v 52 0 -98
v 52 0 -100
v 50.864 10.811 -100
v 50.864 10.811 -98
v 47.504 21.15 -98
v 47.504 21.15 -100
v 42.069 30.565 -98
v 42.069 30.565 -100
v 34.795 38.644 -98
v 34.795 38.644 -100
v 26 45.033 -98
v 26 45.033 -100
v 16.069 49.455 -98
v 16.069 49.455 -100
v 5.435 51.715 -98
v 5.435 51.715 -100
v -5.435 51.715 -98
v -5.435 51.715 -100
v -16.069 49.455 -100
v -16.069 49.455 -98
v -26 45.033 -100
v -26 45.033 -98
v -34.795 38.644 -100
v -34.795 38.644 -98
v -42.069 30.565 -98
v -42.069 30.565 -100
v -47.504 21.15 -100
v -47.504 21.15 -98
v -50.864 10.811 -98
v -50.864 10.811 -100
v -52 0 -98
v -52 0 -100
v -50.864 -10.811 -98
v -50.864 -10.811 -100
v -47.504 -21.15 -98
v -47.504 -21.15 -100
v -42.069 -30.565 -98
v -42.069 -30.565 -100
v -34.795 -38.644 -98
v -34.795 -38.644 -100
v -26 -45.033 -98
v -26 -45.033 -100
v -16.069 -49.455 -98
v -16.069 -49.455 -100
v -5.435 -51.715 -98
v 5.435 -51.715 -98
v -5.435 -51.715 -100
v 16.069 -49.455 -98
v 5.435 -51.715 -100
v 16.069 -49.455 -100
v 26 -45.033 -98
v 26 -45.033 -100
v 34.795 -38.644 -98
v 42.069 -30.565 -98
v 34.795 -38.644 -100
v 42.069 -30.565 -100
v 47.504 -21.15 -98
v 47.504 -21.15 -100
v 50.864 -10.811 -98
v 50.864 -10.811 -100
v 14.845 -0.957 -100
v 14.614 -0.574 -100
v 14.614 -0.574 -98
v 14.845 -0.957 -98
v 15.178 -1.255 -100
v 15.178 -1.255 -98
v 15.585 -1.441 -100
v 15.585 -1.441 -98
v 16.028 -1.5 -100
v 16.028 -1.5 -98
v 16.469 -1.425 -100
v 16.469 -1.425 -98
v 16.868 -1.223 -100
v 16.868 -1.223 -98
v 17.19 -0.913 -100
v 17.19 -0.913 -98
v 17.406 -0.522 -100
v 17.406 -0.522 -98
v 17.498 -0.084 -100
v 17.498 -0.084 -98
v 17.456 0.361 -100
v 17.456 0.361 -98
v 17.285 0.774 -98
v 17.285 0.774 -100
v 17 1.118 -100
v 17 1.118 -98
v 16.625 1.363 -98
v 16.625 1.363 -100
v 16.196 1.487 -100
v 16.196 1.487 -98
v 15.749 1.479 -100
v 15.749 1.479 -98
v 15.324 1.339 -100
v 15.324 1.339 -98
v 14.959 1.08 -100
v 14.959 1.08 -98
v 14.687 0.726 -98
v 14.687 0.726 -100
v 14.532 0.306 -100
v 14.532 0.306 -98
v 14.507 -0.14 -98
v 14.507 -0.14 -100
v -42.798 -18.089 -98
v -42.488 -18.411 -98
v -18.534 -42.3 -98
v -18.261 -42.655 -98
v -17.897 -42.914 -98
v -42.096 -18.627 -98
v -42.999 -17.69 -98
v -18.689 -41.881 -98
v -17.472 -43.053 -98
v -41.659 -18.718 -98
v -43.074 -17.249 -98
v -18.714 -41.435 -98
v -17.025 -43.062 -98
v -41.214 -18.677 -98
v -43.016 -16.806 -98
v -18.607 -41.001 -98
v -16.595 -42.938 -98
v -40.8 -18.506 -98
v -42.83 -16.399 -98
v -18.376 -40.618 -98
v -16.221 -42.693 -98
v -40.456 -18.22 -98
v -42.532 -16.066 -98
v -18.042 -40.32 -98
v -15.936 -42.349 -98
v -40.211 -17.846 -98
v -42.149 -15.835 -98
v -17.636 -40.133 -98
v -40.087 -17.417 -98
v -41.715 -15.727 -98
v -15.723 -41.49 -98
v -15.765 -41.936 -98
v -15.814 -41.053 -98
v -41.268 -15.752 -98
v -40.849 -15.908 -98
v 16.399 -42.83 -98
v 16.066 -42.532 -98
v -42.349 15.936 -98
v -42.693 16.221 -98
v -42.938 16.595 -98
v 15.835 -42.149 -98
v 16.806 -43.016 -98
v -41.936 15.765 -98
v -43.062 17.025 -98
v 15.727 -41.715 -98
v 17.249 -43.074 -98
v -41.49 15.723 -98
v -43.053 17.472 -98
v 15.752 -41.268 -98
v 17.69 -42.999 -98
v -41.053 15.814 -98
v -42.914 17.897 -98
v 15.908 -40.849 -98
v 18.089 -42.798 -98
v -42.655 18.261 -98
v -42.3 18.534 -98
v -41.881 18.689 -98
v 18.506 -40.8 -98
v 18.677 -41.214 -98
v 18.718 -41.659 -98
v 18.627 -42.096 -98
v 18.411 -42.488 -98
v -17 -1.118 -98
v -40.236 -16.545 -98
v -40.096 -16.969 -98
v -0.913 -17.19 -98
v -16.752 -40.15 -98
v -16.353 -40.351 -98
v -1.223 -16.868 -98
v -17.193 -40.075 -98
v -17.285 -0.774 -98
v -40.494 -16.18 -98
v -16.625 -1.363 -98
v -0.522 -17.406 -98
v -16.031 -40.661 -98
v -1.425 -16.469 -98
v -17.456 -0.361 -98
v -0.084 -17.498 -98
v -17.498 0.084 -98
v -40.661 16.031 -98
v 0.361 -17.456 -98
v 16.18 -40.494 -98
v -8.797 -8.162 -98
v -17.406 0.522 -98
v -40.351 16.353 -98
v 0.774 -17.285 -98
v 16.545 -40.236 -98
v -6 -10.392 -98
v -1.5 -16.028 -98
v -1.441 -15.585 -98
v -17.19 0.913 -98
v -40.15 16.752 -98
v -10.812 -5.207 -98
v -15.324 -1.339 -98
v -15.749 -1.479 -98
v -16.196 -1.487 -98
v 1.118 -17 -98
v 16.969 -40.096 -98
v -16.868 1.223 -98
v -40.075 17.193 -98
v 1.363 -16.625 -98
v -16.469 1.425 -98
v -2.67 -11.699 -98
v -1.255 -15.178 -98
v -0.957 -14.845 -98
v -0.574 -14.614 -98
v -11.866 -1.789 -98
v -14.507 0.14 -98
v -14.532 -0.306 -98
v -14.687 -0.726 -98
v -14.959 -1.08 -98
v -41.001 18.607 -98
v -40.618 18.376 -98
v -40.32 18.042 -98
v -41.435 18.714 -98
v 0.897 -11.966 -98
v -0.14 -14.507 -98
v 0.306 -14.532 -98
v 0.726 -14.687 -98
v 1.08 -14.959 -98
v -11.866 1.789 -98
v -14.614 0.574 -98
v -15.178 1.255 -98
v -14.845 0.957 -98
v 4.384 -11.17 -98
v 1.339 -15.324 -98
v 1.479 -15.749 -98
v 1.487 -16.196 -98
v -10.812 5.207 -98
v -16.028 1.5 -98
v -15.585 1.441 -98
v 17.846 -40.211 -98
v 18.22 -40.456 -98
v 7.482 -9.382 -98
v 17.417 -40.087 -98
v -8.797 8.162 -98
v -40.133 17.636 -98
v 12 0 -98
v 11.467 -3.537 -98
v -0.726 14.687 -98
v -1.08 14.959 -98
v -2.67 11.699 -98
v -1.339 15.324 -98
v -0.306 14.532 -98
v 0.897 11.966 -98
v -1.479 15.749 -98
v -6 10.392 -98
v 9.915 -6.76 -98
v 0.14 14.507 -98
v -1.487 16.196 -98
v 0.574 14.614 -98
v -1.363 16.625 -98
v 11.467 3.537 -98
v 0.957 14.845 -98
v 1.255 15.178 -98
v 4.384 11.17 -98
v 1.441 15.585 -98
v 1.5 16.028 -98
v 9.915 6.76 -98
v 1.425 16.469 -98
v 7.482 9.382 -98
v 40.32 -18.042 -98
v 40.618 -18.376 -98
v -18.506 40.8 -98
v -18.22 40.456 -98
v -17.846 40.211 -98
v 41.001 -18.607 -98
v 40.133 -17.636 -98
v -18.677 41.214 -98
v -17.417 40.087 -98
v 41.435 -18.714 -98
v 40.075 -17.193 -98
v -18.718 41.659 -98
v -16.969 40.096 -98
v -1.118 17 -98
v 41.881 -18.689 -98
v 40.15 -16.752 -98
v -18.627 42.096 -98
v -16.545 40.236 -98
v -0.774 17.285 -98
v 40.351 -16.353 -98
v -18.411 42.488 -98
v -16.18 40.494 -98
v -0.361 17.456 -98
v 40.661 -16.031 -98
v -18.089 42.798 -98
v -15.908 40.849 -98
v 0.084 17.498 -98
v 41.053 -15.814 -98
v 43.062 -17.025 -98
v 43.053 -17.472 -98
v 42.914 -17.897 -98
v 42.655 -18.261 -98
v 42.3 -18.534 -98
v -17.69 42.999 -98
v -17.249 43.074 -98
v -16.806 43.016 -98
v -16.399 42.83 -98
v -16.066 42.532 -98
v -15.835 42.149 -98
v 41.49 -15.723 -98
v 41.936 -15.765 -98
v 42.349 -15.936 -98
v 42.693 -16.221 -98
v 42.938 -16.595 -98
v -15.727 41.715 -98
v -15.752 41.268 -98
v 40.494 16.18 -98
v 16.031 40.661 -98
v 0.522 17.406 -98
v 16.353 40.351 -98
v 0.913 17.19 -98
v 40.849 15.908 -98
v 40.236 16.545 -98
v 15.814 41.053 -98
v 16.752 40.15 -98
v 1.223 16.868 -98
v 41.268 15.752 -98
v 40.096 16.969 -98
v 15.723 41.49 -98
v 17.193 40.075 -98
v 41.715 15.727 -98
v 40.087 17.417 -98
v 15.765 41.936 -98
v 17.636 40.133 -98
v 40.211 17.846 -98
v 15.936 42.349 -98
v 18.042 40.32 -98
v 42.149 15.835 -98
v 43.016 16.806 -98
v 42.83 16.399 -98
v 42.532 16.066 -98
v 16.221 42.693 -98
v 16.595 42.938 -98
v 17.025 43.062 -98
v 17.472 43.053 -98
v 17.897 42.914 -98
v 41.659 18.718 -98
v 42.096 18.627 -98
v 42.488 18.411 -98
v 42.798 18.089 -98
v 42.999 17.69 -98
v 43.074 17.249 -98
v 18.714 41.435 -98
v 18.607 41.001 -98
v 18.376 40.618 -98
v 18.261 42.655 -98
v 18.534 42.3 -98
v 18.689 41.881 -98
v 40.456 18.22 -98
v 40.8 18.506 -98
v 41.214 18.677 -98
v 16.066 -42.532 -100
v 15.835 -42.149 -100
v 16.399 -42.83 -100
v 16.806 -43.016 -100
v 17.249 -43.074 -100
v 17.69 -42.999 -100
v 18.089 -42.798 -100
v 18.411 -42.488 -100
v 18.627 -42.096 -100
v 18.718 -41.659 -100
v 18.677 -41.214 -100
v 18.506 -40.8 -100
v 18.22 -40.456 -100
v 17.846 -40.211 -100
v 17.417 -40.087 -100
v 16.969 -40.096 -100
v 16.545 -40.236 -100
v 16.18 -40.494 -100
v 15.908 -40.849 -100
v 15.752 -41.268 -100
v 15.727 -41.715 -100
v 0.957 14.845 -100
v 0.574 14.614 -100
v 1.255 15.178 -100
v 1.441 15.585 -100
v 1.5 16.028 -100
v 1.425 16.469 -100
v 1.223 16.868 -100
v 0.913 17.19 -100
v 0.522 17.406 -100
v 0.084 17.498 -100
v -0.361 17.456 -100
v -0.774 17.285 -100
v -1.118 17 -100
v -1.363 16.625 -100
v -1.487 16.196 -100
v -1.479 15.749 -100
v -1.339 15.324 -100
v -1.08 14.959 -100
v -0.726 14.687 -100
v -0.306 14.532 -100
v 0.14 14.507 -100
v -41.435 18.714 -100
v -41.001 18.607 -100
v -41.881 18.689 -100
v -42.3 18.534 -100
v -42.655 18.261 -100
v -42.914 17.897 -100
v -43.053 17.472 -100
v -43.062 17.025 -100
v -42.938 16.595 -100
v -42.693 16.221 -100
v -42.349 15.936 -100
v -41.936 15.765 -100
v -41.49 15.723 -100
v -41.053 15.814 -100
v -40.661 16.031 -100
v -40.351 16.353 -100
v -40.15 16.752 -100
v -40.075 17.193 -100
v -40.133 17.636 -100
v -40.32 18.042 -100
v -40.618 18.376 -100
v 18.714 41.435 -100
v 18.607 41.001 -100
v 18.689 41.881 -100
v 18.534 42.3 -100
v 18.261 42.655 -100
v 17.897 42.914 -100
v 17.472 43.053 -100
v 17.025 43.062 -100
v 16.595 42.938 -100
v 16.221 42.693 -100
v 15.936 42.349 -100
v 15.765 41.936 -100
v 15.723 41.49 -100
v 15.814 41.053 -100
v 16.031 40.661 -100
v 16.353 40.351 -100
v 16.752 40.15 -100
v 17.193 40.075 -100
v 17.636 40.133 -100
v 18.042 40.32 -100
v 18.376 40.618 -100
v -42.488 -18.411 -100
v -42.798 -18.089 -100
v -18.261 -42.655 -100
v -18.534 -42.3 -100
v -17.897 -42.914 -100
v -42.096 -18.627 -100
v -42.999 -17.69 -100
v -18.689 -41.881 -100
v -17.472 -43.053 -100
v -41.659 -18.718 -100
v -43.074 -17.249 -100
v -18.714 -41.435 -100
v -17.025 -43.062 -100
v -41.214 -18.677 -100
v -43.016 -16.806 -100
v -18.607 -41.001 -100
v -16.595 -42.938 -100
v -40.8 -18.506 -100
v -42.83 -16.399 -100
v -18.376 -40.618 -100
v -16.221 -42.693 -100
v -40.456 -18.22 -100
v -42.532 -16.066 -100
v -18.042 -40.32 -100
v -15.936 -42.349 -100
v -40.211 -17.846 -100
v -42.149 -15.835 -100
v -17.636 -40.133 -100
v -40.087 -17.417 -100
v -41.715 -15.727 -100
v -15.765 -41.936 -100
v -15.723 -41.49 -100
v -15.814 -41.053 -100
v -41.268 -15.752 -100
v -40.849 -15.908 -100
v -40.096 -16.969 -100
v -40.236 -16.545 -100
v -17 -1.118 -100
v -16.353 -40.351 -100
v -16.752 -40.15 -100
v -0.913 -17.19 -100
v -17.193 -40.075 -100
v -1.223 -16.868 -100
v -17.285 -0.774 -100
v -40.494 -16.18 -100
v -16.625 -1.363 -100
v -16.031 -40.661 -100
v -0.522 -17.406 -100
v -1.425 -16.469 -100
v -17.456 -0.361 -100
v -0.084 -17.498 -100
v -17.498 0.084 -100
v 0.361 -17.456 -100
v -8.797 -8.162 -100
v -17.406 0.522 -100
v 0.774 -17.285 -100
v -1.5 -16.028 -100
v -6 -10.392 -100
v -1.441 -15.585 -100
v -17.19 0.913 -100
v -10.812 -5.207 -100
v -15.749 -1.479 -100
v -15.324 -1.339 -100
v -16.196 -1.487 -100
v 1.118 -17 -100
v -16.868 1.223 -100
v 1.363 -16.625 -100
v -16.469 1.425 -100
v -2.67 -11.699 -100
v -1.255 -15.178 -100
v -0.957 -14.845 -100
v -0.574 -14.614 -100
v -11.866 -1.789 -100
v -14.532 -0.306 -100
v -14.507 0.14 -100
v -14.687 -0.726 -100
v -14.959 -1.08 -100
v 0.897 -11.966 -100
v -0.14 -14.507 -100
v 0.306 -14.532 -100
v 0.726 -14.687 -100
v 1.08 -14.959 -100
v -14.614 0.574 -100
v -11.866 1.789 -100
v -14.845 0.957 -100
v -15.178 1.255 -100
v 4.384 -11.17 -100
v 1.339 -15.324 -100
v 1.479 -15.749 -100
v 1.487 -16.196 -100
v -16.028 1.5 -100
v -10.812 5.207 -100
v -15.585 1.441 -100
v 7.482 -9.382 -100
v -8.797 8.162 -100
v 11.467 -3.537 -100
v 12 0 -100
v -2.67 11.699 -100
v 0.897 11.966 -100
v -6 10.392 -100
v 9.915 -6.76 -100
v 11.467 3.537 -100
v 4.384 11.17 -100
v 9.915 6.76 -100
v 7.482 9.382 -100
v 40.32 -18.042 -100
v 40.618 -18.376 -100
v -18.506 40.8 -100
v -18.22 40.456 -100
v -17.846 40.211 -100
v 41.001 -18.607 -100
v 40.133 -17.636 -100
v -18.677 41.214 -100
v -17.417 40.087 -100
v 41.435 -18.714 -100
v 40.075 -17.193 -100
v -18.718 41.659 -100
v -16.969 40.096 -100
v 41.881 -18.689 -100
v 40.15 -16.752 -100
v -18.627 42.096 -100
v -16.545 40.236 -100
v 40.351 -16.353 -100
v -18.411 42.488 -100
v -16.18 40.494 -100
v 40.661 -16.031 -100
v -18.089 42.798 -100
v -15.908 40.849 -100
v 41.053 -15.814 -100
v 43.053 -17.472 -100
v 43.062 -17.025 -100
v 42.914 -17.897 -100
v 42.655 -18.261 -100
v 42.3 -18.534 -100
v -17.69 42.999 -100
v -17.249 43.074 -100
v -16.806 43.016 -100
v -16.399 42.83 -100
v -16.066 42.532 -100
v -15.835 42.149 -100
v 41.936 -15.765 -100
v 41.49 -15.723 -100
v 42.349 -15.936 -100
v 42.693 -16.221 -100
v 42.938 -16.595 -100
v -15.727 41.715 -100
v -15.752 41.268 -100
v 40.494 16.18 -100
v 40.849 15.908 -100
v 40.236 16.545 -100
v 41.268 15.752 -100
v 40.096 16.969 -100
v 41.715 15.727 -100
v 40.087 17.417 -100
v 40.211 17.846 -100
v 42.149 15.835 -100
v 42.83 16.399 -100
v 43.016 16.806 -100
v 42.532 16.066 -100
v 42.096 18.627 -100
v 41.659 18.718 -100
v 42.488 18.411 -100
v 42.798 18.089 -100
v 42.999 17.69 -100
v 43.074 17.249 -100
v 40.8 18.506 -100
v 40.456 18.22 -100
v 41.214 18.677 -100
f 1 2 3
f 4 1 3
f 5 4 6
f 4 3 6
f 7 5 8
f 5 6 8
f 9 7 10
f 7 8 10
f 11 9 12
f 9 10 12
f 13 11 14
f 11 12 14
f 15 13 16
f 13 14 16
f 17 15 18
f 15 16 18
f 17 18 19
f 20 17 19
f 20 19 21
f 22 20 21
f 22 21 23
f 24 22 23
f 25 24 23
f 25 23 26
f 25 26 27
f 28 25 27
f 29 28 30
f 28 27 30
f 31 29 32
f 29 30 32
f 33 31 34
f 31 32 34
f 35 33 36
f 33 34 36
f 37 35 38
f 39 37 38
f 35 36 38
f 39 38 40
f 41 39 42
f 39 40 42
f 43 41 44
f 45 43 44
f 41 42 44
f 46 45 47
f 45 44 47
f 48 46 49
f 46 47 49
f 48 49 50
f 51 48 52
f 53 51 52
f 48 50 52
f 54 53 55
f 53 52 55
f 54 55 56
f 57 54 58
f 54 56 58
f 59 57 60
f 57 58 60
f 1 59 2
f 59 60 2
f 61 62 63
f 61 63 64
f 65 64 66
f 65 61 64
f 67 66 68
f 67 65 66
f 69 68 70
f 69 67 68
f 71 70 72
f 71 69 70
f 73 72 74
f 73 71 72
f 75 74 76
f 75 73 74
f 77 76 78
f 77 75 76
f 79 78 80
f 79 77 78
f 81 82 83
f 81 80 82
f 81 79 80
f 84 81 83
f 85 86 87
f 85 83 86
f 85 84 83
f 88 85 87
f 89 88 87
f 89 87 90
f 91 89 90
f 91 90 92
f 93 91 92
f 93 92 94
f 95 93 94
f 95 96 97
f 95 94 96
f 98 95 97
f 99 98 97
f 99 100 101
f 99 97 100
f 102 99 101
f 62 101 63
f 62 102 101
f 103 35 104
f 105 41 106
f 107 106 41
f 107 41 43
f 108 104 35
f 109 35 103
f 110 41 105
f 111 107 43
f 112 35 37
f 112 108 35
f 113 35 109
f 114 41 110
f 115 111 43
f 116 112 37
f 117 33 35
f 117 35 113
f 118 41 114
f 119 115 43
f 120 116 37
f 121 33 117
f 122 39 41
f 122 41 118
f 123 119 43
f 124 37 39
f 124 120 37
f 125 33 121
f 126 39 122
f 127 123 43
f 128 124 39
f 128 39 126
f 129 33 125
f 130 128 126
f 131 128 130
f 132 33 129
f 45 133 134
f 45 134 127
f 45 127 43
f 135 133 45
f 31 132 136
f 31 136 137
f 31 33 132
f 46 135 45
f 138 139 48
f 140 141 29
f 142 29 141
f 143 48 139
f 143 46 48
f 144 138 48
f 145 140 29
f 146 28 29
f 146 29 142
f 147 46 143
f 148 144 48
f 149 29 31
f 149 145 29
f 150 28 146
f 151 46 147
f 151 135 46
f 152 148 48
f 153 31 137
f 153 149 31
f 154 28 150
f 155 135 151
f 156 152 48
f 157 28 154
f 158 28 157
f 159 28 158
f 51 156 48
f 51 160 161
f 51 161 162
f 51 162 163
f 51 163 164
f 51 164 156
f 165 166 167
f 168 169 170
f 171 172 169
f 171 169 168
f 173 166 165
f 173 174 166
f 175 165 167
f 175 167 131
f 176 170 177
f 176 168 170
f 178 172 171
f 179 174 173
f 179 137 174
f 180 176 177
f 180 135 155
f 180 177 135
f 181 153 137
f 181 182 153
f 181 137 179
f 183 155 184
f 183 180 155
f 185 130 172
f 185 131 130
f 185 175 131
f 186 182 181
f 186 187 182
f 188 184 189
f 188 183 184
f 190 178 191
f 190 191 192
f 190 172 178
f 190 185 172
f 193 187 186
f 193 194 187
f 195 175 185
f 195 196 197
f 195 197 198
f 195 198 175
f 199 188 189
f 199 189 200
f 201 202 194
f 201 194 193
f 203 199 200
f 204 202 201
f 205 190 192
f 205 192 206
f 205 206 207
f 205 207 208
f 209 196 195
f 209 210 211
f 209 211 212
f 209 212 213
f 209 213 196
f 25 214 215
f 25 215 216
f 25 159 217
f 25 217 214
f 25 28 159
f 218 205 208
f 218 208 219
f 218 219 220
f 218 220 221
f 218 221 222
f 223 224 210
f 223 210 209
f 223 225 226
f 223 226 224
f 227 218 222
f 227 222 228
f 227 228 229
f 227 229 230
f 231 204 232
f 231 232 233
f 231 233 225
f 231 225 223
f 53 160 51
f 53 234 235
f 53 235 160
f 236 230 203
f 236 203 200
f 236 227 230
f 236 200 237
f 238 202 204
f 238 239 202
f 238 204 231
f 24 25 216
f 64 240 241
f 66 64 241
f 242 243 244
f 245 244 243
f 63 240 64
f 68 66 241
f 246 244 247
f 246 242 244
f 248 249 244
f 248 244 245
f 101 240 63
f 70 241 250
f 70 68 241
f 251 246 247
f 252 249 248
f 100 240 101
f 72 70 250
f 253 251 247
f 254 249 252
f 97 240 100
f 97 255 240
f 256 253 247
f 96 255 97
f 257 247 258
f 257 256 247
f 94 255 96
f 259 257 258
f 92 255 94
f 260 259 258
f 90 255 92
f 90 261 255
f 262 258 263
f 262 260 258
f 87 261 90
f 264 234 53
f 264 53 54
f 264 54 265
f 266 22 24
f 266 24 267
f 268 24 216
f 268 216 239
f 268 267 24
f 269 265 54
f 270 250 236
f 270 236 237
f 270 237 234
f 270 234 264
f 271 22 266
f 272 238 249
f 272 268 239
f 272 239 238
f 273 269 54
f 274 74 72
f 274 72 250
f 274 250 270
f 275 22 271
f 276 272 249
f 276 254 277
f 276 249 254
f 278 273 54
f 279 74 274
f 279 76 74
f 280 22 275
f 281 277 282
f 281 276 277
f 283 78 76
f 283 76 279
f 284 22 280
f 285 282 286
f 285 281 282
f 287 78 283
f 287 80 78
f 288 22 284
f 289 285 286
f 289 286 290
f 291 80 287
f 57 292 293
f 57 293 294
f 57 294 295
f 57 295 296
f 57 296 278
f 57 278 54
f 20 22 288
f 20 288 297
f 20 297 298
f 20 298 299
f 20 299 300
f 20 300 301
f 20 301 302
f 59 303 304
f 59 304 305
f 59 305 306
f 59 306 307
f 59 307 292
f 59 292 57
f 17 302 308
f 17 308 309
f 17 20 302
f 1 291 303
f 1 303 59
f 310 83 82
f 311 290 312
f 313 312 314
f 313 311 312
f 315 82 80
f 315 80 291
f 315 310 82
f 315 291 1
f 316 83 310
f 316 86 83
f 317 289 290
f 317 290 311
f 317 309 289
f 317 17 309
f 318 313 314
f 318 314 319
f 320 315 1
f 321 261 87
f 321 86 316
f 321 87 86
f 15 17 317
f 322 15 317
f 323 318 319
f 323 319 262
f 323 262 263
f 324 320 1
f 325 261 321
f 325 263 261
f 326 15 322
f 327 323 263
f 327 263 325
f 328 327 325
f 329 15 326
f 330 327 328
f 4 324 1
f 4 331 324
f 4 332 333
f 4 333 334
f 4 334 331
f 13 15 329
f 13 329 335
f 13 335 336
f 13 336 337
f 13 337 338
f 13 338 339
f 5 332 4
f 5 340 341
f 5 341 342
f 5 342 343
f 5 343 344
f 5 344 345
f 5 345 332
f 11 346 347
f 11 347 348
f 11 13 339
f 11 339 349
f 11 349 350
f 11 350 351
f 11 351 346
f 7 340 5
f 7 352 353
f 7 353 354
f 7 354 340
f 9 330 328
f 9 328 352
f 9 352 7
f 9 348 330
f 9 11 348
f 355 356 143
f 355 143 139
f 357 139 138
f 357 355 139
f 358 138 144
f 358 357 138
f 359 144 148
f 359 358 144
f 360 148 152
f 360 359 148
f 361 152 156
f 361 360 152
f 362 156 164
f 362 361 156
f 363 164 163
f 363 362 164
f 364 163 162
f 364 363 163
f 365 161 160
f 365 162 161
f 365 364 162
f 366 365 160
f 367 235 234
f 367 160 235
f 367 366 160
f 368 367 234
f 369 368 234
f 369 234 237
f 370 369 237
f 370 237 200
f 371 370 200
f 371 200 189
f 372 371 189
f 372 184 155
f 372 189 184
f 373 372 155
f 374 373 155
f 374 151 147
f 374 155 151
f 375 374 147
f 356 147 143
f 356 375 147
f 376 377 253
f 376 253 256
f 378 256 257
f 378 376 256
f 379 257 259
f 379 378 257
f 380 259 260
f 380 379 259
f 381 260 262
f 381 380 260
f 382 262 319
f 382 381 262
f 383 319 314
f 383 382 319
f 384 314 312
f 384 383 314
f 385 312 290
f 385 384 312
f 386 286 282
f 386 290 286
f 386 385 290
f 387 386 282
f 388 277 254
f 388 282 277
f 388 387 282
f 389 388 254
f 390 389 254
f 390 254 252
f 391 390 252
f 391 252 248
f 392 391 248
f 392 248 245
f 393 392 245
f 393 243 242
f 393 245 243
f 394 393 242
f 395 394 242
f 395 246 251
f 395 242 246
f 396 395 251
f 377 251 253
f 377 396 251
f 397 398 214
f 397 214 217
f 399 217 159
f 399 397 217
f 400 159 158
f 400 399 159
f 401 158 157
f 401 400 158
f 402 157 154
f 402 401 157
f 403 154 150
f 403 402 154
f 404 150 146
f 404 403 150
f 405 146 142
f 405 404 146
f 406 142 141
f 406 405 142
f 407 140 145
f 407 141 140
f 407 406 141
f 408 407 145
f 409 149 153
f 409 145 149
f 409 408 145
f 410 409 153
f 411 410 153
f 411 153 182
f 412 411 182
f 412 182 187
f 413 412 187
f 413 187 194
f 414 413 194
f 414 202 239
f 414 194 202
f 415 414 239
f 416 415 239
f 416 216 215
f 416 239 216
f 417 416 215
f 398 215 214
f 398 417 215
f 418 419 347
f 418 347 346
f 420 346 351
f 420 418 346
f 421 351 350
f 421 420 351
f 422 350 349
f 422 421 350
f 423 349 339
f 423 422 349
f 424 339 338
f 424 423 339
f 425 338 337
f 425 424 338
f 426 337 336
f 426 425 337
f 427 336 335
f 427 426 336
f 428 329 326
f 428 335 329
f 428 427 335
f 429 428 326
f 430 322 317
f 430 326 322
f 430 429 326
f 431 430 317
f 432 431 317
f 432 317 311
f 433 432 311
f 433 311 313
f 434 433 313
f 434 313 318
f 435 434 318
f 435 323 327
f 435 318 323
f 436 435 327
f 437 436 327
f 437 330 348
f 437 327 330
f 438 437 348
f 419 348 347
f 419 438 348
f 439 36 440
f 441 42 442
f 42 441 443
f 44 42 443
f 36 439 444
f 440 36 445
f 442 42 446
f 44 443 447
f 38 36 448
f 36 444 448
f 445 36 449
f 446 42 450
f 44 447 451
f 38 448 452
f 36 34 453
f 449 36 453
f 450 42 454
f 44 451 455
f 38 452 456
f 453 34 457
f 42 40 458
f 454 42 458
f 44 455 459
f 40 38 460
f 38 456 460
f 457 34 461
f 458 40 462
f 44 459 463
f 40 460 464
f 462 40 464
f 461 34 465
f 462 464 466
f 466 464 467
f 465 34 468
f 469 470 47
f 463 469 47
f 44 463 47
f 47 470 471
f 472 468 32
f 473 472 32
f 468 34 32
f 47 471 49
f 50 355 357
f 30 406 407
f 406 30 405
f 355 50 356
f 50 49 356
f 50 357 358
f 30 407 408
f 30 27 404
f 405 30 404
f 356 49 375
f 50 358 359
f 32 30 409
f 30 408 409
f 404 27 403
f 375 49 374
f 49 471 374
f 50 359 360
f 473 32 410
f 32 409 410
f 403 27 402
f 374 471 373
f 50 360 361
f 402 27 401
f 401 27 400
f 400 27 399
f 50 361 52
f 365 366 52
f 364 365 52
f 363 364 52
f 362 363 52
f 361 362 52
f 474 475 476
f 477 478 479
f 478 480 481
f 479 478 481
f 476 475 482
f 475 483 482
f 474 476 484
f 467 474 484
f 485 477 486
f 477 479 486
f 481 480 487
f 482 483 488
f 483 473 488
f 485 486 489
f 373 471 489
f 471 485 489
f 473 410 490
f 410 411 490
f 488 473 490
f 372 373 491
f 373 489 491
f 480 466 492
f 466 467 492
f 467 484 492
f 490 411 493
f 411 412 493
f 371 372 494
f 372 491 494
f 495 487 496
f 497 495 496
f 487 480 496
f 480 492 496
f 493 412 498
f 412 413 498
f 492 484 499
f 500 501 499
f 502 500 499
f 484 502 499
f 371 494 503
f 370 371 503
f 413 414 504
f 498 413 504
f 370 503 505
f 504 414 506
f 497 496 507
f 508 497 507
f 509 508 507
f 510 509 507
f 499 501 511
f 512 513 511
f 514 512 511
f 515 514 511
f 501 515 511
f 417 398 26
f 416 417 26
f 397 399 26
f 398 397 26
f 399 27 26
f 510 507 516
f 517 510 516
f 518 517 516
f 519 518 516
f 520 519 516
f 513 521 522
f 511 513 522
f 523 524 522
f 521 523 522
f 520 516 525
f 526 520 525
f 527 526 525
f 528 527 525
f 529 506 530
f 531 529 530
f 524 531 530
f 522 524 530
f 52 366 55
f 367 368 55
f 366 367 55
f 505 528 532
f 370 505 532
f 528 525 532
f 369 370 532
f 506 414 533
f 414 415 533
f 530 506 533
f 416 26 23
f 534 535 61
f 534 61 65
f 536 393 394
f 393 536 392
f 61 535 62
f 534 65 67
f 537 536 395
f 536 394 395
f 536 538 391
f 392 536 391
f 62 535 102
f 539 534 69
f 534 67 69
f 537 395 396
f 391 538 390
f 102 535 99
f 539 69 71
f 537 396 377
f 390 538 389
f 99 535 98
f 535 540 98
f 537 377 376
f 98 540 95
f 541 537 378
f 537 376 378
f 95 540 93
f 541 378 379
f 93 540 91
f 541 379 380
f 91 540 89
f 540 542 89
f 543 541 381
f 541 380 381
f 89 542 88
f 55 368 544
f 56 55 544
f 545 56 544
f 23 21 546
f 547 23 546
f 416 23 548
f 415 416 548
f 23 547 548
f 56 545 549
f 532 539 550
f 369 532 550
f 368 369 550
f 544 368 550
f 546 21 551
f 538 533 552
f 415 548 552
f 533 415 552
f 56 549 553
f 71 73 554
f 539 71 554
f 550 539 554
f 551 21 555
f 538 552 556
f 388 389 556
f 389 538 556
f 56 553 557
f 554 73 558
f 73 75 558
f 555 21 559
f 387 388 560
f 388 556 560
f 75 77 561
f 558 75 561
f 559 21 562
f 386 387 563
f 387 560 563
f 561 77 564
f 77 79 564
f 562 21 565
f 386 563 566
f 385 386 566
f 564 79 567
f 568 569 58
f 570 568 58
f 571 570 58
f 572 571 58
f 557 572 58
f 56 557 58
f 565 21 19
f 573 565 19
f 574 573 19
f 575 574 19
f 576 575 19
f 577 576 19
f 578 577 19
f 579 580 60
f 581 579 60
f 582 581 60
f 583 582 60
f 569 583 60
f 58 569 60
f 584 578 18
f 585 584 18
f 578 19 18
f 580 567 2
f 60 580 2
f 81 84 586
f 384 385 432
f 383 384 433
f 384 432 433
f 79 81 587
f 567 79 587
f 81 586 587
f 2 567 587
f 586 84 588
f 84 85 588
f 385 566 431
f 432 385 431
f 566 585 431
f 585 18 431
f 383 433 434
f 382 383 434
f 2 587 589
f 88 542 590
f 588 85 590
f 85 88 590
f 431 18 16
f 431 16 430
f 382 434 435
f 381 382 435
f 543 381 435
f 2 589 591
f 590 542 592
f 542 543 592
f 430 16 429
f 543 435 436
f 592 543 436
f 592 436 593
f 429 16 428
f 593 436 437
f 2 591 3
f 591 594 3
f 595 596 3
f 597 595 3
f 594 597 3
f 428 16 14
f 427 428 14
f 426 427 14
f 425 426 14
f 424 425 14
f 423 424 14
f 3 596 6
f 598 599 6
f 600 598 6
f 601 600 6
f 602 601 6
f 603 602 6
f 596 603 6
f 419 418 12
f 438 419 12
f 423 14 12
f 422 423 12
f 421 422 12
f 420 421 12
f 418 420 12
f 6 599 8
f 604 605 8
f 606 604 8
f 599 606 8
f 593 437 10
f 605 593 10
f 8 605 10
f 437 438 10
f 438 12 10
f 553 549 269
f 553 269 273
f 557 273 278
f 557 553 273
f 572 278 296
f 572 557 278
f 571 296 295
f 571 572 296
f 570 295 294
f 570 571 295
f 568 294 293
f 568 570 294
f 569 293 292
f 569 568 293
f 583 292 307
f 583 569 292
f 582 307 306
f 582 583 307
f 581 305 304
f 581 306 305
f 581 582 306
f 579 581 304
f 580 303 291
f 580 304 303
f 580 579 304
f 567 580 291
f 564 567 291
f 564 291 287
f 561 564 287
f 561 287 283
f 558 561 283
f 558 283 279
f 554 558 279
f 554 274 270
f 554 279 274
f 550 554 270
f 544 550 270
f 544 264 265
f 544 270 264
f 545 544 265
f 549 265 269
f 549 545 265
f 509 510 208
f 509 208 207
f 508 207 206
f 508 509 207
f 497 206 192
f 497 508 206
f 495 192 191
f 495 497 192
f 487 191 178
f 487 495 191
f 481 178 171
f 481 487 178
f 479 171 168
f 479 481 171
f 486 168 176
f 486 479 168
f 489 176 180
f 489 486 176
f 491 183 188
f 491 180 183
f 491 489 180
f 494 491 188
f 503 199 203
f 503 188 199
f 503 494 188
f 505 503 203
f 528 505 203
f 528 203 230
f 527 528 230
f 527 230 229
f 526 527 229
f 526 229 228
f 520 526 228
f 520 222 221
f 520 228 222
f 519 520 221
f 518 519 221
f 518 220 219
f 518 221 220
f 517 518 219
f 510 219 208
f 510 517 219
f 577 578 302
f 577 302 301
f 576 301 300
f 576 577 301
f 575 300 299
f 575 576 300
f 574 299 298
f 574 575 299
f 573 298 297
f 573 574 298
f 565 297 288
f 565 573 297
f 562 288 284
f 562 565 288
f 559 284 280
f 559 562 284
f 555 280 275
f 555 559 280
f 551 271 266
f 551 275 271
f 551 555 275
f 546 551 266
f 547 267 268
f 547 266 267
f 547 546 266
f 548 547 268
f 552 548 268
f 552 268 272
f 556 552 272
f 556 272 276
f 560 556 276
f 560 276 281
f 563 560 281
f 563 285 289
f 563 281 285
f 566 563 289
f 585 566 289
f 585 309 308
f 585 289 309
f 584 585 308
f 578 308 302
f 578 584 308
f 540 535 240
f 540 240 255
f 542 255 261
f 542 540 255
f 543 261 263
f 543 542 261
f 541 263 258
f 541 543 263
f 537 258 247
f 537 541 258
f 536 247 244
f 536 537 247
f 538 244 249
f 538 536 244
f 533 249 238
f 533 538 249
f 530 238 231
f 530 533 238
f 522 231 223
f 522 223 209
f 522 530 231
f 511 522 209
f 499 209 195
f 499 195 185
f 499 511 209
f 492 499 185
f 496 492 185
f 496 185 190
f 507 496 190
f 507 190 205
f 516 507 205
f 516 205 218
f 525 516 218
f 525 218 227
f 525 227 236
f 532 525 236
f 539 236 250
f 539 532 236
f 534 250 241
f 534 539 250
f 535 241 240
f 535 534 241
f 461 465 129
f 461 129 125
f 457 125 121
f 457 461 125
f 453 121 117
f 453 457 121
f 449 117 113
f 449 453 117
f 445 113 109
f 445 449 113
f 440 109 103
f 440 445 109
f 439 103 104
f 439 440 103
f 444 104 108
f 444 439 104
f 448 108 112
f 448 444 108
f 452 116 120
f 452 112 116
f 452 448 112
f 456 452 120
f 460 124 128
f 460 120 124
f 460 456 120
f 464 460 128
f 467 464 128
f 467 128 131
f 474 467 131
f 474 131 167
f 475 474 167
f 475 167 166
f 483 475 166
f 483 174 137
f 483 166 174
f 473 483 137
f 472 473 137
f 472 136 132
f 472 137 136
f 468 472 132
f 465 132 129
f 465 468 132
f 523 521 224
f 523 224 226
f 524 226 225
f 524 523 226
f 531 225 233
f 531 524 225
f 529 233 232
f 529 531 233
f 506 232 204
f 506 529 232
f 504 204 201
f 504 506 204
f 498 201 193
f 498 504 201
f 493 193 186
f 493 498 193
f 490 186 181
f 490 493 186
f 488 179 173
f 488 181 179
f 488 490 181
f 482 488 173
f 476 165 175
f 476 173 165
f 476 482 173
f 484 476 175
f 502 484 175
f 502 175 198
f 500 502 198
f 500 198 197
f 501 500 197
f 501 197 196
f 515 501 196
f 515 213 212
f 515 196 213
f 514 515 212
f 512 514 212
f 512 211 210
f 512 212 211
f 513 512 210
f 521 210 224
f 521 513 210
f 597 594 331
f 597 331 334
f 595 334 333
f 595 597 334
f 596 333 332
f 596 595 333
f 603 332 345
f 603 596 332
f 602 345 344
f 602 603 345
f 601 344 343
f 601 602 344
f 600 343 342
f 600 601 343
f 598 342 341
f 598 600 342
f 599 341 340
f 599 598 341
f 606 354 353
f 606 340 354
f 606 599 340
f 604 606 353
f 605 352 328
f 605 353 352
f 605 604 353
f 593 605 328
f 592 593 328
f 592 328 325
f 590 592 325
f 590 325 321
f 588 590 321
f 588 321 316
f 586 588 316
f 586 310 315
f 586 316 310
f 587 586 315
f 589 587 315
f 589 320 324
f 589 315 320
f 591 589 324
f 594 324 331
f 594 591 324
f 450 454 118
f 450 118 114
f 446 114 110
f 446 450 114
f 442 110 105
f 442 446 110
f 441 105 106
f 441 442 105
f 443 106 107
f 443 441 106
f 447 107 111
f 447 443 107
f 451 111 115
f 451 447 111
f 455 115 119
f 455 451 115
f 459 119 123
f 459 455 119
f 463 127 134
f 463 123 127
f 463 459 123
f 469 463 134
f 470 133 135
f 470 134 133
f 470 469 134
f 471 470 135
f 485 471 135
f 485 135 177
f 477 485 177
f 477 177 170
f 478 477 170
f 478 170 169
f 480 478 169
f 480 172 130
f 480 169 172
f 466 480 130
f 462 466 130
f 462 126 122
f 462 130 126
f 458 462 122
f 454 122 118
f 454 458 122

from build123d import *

# Parameters (mm, degrees)
CYLINDER623_R               = 1.5
CYLINDER623_DEPTH           = 20
CYLINDER623_PLACEMENT_ANGLE = 45
CYLINDER632_R               = 1.5
CYLINDER632_DEPTH           = 20
CYLINDER629_R               = 1.5
CYLINDER629_DEPTH           = 20
CYLINDER629_PLACEMENT_ANGLE = 135
CYLINDER639_R               = 1.5
CYLINDER639_DEPTH           = 20
CYLINDER638_R               = 1.5
CYLINDER638_DEPTH           = 20
CYLINDER638_PLACEMENT_ANGLE = 225
CYLINDER631_R               = 1.5
CYLINDER631_DEPTH           = 20
CYLINDER633_R               = 1.5
CYLINDER633_DEPTH           = 20
CYLINDER633_PLACEMENT_ANGLE = 45
CYLINDER628_R               = 1.5
CYLINDER628_DEPTH           = 20
COMPOUND654_PLACEMENT_ANGLE = 22.5
CYLINDER625_R               = 1.5
CYLINDER625_DEPTH           = 16
CYLINDER625_PLACEMENT_ANGLE = 67.5
CYLINDER626_R               = 1.5
CYLINDER626_DEPTH           = 16
CYLINDER626_PLACEMENT_ANGLE = 22.5
CYLINDER627_R               = 1.5
CYLINDER627_DEPTH           = 16
CYLINDER627_PLACEMENT_ANGLE = 112.5
CYLINDER630_R               = 1.5
CYLINDER630_DEPTH           = 16
CYLINDER630_PLACEMENT_ANGLE = 202.5
TUBE038_R                   = 52
TUBE038_R_2                 = 12
TUBE038_DEPTH               = 2


with BuildPart() as v_lec623:
    # Cylinder623 → Cylinder623 (new body)
    with BuildSketch(Plane.XY):
        Circle(CYLINDER623_R)
    extrude(amount=CYLINDER623_DEPTH)


with BuildPart() as v_lec623_1:
    # Cylinder623 placement: moved
    add(v_lec623.part.moved(Location((-31.819805, 31.819805, -18))).rotate(Axis((-31.819805, 31.819805, -18), (0, 0, 1)), CYLINDER623_PLACEMENT_ANGLE))


with BuildPart() as v_lec632:
    # Cylinder632 → Cylinder632 (new body)
    with BuildSketch(Plane(origin=(-45, 0, -18), x_dir=(0, 1, 0), z_dir=(0, 0, 1))):
        Circle(CYLINDER632_R)
    extrude(amount=CYLINDER632_DEPTH)


with BuildPart() as v_lec629:
    # Cylinder629 → Cylinder629 (new body)
    with BuildSketch(Plane.XY):
        Circle(CYLINDER629_R)
    extrude(amount=CYLINDER629_DEPTH)


with BuildPart() as v_lec629_1:
    # Cylinder629 placement: moved
    add(v_lec629.part.moved(Location((-31.819805, -31.819805, -18))).rotate(Axis((-31.819805, -31.819805, -18), (0, 0, 1)), CYLINDER629_PLACEMENT_ANGLE))


with BuildPart() as v_lec639:
    # Cylinder639 → Cylinder639 (new body)
    with BuildSketch(Plane(origin=(0, -45, -18), x_dir=(-1, 0, 0), z_dir=(0, 0, 1))):
        Circle(CYLINDER639_R)
    extrude(amount=CYLINDER639_DEPTH)


with BuildPart() as v_lec638:
    # Cylinder638 → Cylinder638 (new body)
    with BuildSketch(Plane.XY):
        Circle(CYLINDER638_R)
    extrude(amount=CYLINDER638_DEPTH)


with BuildPart() as v_lec638_1:
    # Cylinder638 placement: moved
    add(v_lec638.part.moved(Location((31.819805, -31.819805, -18))).rotate(Axis((31.819805, -31.819805, -18), (0, 0, 1)), CYLINDER638_PLACEMENT_ANGLE))


with BuildPart() as v_lec631:
    # Cylinder631 → Cylinder631 (new body)
    with BuildSketch(Plane(origin=(45, 0, -18), x_dir=(0, -1, 0), z_dir=(0, 0, 1))):
        Circle(CYLINDER631_R)
    extrude(amount=CYLINDER631_DEPTH)


with BuildPart() as v_lec633:
    # Cylinder633 → Cylinder633 (new body)
    with BuildSketch(Plane.XY):
        Circle(CYLINDER633_R)
    extrude(amount=CYLINDER633_DEPTH)


with BuildPart() as v_lec633_1:
    # Cylinder633 placement: moved
    add(v_lec633.part.moved(Location((31.819805, 31.819805, -18))).rotate(Axis((31.819805, 31.819805, -18), (0, 0, -1)), CYLINDER633_PLACEMENT_ANGLE))


with BuildPart() as compound654:
    # Cylinder628 → Cylinder628 (new body)
    with BuildSketch(Plane(origin=(0, 45, -18), x_dir=(1, 0, 0), z_dir=(0, 0, 1))):
        Circle(CYLINDER628_R)
    extrude(amount=CYLINDER628_DEPTH)

    # Compound654: union Válec623, Válec632, Válec629, Válec639, Válec638, Válec631, Válec633
    add(v_lec623_1.part)
    add(v_lec632.part)
    add(v_lec629_1.part)
    add(v_lec639.part)
    add(v_lec638_1.part)
    add(v_lec631.part)
    add(v_lec633_1.part)


with BuildPart() as compound654_1:
    # Compound654 placement: moved
    add(compound654.part.moved(Location((0, 0, -87))).rotate(Axis((0, 0, -87), (0, 0, 1)), COMPOUND654_PLACEMENT_ANGLE))


with BuildPart() as v_lec625:
    # Cylinder625 → Cylinder625 (new body)
    with BuildSketch(Plane.XY):
        Circle(CYLINDER625_R)
    extrude(amount=CYLINDER625_DEPTH)


with BuildPart() as v_lec625_1:
    # Cylinder625 placement: moved
    add(v_lec625.part.moved(Location((0, 16, 2))).rotate(Axis((0, 16, 2), (0, 0, -1)), CYLINDER625_PLACEMENT_ANGLE))


with BuildPart() as v_lec626:
    # Cylinder626 → Cylinder626 (new body)
    with BuildSketch(Plane.XY):
        Circle(CYLINDER626_R)
    extrude(amount=CYLINDER626_DEPTH)


with BuildPart() as v_lec626_1:
    # Cylinder626 placement: moved
    add(v_lec626.part.moved(Location((-16, 0, 2))).rotate(Axis((-16, 0, 2), (0, 0, 1)), CYLINDER626_PLACEMENT_ANGLE))


with BuildPart() as v_lec627:
    # Cylinder627 → Cylinder627 (new body)
    with BuildSketch(Plane.XY):
        Circle(CYLINDER627_R)
    extrude(amount=CYLINDER627_DEPTH)


with BuildPart() as v_lec627_1:
    # Cylinder627 placement: moved
    add(v_lec627.part.moved(Location((0, -16, 2))).rotate(Axis((0, -16, 2), (0, 0, 1)), CYLINDER627_PLACEMENT_ANGLE))


with BuildPart() as compound653:
    # Cylinder630 → Cylinder630 (new body)
    with BuildSketch(Plane.XY):
        Circle(CYLINDER630_R)
    extrude(amount=CYLINDER630_DEPTH)


with BuildPart() as compound653_1:
    # Cylinder630 placement: moved
    add(compound653.part.moved(Location((16, 0, 2))).rotate(Axis((16, 0, 2), (0, 0, 1)), CYLINDER630_PLACEMENT_ANGLE))

    # Compound653: union Válec625, Válec626, Válec627
    add(v_lec625_1.part)
    add(v_lec626_1.part)
    add(v_lec627_1.part)


with BuildPart() as compound653_2:
    # Compound653 placement: moved
    add(compound653_1.part.moved(Location((0, 0, -111))))


with BuildPart() as cut287:
    # Tube038 → Tube038 (new body)
    with BuildSketch(Plane.XY.offset(-100)):
        Circle(TUBE038_R)
        Circle(TUBE038_R_2, mode=Mode.SUBTRACT)
    extrude(amount=TUBE038_DEPTH)

    # Cut285: cut Compound653
    add(compound653_2.part, mode=Mode.SUBTRACT)

    # Cut287: cut Compound654
    add(compound654_1.part, mode=Mode.SUBTRACT)


solid = cut287.part
